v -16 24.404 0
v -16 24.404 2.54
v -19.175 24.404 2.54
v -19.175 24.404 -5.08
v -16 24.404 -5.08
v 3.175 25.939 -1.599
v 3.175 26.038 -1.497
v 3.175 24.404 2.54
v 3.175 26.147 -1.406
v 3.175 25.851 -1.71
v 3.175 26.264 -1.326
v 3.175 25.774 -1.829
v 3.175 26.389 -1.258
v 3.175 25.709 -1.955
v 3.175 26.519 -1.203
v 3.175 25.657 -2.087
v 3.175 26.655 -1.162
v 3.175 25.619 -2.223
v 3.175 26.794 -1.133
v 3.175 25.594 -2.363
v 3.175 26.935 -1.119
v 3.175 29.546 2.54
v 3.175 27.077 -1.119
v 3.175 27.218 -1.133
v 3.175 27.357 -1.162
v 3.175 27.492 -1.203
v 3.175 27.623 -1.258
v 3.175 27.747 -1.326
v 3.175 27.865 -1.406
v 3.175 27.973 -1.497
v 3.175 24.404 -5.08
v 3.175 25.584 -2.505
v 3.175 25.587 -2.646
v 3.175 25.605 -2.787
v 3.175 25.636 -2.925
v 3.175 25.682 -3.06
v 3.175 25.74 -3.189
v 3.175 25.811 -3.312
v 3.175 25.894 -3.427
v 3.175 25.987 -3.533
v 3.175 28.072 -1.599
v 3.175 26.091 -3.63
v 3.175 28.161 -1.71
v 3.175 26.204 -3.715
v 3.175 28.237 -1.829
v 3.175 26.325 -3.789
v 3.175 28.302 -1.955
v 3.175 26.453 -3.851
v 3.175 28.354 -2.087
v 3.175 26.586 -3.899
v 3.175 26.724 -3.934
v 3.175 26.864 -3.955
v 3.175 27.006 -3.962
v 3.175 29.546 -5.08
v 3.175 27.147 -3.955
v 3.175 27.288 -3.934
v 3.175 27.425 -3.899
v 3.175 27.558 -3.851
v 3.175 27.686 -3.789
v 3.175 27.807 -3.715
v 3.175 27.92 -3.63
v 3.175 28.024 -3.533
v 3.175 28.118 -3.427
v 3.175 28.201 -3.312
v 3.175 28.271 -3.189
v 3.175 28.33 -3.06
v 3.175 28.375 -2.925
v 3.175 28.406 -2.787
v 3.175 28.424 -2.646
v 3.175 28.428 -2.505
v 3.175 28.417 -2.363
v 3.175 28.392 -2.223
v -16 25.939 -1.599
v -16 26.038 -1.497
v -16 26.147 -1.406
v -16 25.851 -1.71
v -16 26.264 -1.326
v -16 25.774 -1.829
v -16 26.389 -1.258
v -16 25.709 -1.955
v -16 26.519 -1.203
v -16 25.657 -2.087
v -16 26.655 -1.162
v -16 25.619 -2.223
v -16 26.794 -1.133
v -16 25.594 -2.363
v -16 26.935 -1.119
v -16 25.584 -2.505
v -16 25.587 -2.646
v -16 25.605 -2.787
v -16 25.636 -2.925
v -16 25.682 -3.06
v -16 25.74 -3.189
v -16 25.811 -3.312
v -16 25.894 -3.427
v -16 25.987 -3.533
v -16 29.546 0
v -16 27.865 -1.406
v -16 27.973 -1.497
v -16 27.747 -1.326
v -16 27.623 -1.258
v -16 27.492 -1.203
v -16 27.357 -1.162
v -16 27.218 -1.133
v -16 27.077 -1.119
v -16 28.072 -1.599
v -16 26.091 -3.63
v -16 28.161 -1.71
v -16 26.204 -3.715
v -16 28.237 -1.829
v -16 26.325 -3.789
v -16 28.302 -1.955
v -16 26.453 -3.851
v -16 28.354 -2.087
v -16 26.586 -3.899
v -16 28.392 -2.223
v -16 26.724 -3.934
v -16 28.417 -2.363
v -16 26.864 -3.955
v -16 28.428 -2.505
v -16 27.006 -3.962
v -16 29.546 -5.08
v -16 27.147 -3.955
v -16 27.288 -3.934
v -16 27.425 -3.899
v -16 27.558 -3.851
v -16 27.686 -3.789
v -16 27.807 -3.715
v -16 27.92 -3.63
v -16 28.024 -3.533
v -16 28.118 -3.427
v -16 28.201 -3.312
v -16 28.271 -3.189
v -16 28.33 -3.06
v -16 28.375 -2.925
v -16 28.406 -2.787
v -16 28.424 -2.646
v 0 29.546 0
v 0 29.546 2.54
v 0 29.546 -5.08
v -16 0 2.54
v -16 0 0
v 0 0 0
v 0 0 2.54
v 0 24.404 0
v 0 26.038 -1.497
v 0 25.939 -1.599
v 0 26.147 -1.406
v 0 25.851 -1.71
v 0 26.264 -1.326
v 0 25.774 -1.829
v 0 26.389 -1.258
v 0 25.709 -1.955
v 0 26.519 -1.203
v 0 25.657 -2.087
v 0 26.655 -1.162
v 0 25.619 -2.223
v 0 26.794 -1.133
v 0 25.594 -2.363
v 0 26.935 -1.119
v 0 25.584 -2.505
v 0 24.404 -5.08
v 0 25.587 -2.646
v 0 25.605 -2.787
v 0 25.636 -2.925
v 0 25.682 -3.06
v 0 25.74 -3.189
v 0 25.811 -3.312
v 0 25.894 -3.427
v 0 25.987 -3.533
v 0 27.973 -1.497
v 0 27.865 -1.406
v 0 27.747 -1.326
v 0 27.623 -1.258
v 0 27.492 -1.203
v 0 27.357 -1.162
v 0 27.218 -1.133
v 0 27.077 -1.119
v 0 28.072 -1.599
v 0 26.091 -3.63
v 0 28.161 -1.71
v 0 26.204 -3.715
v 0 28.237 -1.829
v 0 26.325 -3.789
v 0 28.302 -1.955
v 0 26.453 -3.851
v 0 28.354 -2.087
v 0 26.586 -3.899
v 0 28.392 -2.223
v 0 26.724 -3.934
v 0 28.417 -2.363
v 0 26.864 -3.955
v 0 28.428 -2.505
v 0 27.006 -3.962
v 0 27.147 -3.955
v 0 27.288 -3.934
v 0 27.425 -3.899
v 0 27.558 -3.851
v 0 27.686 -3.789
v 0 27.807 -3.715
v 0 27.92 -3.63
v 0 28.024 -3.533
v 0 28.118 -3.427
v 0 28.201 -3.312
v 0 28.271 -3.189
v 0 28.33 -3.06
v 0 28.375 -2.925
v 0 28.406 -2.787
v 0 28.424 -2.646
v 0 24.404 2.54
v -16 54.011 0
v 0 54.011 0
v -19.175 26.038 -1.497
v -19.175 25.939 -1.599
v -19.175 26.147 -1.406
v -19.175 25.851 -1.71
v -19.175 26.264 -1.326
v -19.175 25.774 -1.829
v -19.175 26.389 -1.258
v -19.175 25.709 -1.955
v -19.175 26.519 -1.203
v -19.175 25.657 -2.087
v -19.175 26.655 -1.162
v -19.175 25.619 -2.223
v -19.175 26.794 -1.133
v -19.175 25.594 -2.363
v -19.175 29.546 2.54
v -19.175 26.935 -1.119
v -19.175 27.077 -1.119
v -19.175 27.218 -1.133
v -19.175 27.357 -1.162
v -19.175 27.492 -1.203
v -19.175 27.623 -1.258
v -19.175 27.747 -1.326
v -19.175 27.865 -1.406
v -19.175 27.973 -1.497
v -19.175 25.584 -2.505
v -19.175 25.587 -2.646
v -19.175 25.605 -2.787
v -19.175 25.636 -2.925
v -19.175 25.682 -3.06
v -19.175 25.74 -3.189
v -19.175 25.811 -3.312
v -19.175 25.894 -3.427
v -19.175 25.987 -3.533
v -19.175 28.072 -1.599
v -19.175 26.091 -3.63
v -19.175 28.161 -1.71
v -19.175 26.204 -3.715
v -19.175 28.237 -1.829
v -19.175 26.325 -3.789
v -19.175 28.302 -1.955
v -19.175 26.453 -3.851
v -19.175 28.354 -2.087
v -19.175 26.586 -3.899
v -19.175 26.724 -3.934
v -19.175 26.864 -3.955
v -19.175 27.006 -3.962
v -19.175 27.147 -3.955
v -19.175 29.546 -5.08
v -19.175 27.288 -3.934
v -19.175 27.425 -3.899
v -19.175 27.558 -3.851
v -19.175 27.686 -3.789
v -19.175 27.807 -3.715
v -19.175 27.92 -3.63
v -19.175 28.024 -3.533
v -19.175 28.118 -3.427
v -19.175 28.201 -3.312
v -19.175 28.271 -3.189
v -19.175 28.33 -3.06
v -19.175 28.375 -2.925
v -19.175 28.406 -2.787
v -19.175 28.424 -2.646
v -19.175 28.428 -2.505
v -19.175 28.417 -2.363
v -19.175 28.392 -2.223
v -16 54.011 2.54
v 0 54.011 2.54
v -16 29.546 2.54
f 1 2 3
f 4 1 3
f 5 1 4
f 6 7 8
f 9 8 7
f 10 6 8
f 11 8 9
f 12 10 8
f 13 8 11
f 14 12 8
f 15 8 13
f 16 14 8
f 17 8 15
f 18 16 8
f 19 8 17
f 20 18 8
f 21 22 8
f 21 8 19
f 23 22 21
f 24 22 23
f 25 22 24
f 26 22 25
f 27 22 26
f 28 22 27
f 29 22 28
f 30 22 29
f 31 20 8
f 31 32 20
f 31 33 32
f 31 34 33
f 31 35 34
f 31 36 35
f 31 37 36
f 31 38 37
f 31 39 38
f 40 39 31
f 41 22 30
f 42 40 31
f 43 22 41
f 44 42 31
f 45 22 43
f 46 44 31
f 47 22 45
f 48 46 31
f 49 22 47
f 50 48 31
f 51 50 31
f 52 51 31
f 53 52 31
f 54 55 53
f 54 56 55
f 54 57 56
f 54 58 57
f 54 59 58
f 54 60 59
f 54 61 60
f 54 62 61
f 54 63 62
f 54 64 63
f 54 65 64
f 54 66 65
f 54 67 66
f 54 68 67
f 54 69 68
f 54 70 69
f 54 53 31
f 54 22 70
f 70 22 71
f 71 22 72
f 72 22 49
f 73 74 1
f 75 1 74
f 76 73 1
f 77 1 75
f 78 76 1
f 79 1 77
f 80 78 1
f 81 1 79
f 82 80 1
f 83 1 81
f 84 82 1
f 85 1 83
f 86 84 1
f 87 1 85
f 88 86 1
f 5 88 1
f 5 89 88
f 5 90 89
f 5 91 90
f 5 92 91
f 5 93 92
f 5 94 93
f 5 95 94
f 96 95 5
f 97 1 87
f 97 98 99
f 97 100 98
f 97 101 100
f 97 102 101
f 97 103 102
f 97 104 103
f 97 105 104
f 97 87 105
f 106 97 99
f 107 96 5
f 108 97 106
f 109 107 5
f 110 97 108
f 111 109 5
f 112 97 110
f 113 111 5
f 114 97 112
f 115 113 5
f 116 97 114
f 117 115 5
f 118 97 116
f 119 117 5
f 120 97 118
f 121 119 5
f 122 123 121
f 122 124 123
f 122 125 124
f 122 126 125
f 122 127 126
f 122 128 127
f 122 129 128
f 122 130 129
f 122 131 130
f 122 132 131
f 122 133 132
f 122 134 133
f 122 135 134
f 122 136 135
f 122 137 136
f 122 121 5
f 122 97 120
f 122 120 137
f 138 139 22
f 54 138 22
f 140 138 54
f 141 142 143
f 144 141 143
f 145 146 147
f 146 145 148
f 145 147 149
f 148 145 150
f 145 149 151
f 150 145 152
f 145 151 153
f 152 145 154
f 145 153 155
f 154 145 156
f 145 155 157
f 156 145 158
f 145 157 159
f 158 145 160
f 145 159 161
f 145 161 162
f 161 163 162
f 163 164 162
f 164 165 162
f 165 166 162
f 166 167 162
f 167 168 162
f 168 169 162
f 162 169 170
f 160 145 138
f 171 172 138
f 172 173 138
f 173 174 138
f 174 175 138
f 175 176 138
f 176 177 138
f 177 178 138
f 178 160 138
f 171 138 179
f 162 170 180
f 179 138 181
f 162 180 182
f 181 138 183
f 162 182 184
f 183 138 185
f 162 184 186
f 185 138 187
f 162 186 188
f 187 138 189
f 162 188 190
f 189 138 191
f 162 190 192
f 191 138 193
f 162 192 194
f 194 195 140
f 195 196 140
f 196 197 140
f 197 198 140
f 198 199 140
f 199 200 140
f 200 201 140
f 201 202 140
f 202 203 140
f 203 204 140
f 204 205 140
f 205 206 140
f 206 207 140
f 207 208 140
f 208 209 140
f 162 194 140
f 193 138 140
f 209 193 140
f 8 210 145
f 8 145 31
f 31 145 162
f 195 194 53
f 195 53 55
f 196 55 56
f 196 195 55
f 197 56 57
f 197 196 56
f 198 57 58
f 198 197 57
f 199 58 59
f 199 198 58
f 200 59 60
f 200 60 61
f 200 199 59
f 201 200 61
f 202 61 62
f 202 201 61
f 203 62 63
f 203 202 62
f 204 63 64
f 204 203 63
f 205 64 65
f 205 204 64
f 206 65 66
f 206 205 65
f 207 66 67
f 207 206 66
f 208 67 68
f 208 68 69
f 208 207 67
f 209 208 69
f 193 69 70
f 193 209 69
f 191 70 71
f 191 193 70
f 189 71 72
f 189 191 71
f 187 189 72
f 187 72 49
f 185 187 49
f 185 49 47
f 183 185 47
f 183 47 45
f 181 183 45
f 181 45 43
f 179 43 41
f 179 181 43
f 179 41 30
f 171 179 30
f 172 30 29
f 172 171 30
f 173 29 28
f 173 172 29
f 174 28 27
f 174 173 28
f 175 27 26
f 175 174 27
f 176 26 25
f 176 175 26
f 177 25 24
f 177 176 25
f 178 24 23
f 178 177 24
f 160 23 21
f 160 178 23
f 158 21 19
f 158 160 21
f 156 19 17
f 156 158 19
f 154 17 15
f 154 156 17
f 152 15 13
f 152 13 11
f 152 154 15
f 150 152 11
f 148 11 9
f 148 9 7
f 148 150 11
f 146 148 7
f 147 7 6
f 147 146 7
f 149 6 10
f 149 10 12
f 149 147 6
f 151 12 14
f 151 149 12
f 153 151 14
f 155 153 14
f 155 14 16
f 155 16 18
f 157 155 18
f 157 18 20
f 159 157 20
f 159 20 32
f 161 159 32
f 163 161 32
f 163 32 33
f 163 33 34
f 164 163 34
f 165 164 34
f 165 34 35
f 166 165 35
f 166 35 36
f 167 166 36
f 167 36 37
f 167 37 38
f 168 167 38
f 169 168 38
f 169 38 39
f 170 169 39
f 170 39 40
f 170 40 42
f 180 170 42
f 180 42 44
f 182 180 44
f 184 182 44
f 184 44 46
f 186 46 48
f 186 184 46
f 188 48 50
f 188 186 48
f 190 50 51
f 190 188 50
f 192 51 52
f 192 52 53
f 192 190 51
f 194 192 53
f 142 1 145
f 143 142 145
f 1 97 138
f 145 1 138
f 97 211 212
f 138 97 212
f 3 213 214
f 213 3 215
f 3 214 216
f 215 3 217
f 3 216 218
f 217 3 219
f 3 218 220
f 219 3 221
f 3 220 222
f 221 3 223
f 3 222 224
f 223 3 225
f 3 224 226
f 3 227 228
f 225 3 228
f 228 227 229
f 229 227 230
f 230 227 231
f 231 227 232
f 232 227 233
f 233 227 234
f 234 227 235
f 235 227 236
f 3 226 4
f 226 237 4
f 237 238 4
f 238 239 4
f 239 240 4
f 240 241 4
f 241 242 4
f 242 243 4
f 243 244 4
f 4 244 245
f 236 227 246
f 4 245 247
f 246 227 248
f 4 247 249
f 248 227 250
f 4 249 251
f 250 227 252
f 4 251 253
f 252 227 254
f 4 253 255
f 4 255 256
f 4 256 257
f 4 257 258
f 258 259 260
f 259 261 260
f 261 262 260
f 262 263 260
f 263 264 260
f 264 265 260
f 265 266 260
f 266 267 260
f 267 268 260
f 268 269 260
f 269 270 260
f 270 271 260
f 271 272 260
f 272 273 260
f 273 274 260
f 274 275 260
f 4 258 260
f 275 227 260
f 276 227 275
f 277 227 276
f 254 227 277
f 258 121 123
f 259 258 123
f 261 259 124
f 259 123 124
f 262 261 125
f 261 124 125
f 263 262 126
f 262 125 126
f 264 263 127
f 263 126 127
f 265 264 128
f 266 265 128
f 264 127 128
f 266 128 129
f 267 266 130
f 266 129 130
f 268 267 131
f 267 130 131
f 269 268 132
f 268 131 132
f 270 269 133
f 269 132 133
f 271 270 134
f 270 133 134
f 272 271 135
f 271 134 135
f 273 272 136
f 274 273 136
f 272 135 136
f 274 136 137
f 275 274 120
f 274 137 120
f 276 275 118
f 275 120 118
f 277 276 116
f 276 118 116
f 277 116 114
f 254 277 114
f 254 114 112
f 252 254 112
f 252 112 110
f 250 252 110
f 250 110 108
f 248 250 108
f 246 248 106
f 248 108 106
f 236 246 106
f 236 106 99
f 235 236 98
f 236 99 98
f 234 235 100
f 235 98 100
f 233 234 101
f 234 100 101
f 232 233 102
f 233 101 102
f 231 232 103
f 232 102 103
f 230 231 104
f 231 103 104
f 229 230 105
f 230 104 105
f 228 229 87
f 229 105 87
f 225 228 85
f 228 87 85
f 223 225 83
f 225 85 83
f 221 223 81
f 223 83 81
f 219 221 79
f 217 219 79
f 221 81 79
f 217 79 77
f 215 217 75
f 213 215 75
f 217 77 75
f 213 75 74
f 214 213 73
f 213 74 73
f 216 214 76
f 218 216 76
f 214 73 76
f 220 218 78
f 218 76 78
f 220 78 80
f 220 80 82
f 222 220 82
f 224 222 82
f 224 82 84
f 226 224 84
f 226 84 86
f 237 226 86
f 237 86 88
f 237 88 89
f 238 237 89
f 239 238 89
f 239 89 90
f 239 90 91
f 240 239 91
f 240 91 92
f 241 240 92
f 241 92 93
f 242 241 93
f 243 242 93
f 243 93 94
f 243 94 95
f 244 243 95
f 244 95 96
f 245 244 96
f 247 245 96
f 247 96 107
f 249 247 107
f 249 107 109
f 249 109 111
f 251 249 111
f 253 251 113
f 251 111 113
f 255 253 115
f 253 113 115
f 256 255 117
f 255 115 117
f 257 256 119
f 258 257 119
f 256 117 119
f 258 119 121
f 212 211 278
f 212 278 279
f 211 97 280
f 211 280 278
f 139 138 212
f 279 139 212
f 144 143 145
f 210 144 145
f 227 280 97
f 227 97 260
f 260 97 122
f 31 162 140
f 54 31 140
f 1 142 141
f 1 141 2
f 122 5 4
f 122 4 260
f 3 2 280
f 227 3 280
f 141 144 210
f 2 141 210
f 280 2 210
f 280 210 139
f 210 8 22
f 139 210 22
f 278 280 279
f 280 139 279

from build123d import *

# Parameters (mm, degrees)
SKETCH1_W           = 16
SKETCH1_H           = 54.011330832
BOSS_EXTRUDE1_DEPTH = 2.54
SKETCH2_W           = 7.62
SKETCH2_H           = 5.141453329
SKETCH2_R           = 1.4224
BOSS_EXTRUDE2_DEPTH = 3.175


with BuildPart() as part:
    # Sketch1 → Boss-Extrude1 (new body)
    with BuildSketch(Plane.XY):
        with Locations((-8, 27.005665416)):
            Rectangle(SKETCH1_W, SKETCH1_H)
    extrude(amount=BOSS_EXTRUDE1_DEPTH)

    # Sketch2 → Boss-Extrude2 (add)
    with BuildSketch(Plane(origin=(0, 0, 0), x_dir=(0, 0, -1), z_dir=(1, 0, 0))):
        with Locations((1.27, 26.974938752)):
            Rectangle(SKETCH2_W, SKETCH2_H)
        with Locations((2.54, 27.005665416)):
            Circle(SKETCH2_R, mode=Mode.SUBTRACT)
    boss_extrude2 = extrude(amount=BOSS_EXTRUDE2_DEPTH)

    # Mirror1: Boss-Extrude2 across plane
    add(boss_extrude2.mirror(Plane.ZY.offset(8)))


solid = part.part
